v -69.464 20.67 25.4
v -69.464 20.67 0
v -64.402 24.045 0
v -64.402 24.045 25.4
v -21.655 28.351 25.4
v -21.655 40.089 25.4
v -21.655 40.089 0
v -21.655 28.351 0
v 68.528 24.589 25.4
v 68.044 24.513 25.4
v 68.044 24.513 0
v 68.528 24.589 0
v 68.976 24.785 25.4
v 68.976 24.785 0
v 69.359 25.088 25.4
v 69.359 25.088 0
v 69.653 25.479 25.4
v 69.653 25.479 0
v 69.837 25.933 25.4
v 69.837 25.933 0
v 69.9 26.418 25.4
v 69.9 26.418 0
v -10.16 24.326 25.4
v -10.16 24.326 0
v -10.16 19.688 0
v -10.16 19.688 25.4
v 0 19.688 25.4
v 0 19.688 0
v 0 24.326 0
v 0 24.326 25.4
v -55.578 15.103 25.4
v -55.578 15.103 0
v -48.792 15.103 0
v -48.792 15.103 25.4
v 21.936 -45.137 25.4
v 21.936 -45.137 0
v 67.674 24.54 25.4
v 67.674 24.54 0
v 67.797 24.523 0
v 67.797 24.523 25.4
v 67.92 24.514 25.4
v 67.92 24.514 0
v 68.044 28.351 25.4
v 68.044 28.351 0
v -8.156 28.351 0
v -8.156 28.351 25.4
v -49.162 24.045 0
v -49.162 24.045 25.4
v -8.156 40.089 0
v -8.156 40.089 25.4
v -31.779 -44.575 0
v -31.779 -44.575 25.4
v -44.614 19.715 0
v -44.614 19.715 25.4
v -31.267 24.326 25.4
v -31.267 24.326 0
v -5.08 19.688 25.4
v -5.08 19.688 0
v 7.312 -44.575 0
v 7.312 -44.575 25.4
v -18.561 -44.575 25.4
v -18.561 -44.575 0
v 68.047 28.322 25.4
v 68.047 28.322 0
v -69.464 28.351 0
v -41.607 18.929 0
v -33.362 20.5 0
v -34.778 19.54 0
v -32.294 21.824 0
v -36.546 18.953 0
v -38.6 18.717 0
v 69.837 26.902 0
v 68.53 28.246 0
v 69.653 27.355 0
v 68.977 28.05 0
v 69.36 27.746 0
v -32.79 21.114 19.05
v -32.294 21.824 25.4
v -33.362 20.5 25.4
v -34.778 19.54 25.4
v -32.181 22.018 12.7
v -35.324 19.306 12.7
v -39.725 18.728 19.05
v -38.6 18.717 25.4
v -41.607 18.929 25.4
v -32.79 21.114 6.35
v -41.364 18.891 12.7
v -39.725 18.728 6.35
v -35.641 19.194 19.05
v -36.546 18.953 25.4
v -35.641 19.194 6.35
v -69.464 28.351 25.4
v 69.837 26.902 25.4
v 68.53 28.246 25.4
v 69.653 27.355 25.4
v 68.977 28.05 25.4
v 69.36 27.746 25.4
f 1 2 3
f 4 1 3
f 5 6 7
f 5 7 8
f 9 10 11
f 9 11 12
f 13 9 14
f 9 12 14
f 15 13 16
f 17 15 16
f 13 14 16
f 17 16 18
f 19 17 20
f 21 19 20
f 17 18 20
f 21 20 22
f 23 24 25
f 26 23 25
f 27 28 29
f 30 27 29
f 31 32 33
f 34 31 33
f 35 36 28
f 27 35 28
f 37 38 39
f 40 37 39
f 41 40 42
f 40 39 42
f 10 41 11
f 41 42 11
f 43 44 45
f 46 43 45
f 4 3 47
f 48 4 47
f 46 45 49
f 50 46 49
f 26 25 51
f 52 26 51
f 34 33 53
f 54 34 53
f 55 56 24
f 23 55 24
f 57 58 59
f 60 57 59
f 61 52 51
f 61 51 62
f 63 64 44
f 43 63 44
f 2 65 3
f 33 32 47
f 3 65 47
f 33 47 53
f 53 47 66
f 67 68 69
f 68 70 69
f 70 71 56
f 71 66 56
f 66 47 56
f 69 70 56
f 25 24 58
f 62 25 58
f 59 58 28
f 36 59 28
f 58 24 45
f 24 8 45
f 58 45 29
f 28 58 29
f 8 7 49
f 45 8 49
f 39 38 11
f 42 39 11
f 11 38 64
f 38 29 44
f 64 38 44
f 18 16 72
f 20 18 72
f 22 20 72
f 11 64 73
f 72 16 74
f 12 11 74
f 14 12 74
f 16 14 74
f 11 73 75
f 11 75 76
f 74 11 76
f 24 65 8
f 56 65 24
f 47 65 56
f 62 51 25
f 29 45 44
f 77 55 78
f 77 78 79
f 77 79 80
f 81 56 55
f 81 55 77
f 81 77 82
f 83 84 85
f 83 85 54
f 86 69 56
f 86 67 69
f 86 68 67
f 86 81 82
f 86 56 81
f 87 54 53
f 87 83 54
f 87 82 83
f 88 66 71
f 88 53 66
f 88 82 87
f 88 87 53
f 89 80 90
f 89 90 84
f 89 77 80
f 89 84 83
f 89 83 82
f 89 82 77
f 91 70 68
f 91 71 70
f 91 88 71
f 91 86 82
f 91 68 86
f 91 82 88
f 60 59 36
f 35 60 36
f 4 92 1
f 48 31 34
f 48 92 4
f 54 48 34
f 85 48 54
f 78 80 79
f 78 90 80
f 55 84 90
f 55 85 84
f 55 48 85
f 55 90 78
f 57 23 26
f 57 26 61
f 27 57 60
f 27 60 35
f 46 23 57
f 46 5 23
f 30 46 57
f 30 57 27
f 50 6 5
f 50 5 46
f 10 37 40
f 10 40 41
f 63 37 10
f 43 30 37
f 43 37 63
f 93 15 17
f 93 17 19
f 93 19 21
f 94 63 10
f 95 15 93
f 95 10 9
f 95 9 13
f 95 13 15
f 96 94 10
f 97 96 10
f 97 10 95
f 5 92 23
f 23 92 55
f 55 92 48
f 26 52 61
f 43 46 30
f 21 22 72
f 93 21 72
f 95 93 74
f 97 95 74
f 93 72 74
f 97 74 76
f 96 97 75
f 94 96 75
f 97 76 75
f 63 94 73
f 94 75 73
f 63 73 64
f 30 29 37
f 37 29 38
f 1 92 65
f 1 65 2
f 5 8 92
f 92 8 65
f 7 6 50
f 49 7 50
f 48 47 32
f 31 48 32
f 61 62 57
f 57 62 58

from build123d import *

# Parameters (mm, degrees)
F0_W     = 13.4990522638
F0_H     = 6.7189366567
F0_H_2   = 5.0193380237
F1_DEPTH = 25.4


with BuildPart() as f1:
    # F0 (on Top) → F1 (new body)
    with BuildSketch(Plane.XY):
        with Locations((-14.9052026682, 36.7298916125)):
            Rectangle(F0_W, F0_H)
        Polygon((-49.1617234445, 24.0451842546), (-46.0720470312, 28.3510852605), (-69.4638639688, 28.3510852605), (-69.4638639688, 20.6704232842), (-64.4017234445, 24.0451842546), align=None)
        Polygon((-18.5611955822, -44.5749908686), (-5.08, 19.6878403194), (-10.16, 19.6878403194), (-31.7790172994, -44.5749908686), align=None)
        Polygon((21.9359565526, -45.1374538243), (0, 19.6878403194), (-5.08, 19.6878403194), (7.3119853623, -44.5749908686), align=None)
        with Locations((-14.9052026682, 30.8607542723)):
            Rectangle(F0_W, F0_H_2)
        with BuildLine():
            Line((-41.9020165778, 22.7089282594), (-44.6144271886, 19.7146166008))
            add(Edge.make_bspline(
                [(-31.2667824328, 24.3264157325), (-31.9929960152, 21.6699538462), (-34.7602014448, 18.1939718361), (-41.4758034197, 18.5698095031), (-44.6144271886, 19.7146166008)],
                knots=[0, 0, 0, 0, 0.4544832874, 1, 1, 1, 1], degree=3))
            Line((-31.2667824328, 24.3264157325), (-37.5335417804, 24.3264157325))
            add(Edge.make_bspline(
                [(-37.5335417804, 24.3264157325), (-36.8480037486, 22.5468860707), (-34.5986306719, 21.0862357426), (-37.8524884582, 21.3479679078), (-41.9020165778, 22.7089282594)],
                knots=[0, 0, 0, 0, 0.4183773916, 1, 1, 1, 1], degree=3))
        make_face()
        Polygon((0, 19.6878403194), (0, 24.3264157325), (-10.16, 24.3264157325), (-10.16, 19.6878403194), (-5.08, 19.6878403194), align=None)
        with BuildLine():
            Line((-8.1556765363, 28.3510852605), (-21.6547288001, 28.3510852605))
            Line((-21.6547288001, 28.3510852605), (-46.0720470312, 28.3510852605))
            Line((-46.0720470312, 28.3510852605), (-49.1617234445, 24.0451842546))
            Line((-49.1617234445, 24.0451842546), (-55.57827127, 15.1028174692))
            Line((-55.57827127, 15.1028174692), (-48.7920460626, 15.1028174692))
            Line((-48.7920460626, 15.1028174692), (-44.6144271886, 19.7146166008))
            Line((-44.6144271886, 19.7146166008), (-41.9020165778, 22.7089282594))
            Line((-41.9020165778, 22.7089282594), (-40.4368083146, 24.3264157325))
            Line((-40.4368083146, 24.3264157325), (-37.5335417804, 24.3264157325))
            Line((-37.5335417804, 24.3264157325), (-31.2667824328, 24.3264157325))
            Line((-31.2667824328, 24.3264157325), (-10.16, 24.3264157325))
            Line((-10.16, 24.3264157325), (0, 24.3264157325))
            Line((0, 24.3264157325), (67.6737308797, 24.5399160971))
            ThreePointArc((67.6737308797, 24.5399160971), (66.0991955865, 26.6047667833), (68.04705303, 28.3219217342))
            Line((68.04705303, 28.3219217342), (68.0443234637, 28.3510852605))
            Line((68.0443234637, 28.3510852605), (-8.1556765363, 28.3510852605))
        make_face()
        with BuildLine():
            Line((-40.4368083146, 24.3264157325), (-41.9020165778, 22.7089282594))
            add(Edge.make_bspline(
                [(-37.5335417804, 24.3264157325), (-36.8480037486, 22.5468860707), (-34.5986306719, 21.0862357426), (-37.8524884582, 21.3479679078), (-41.9020165778, 22.7089282594)],
                knots=[0, 0, 0, 0, 0.4183773916, 1, 1, 1, 1], degree=3))
            Line((-37.5335417804, 24.3264157325), (-40.4368083146, 24.3264157325))
        make_face()
        with BuildLine():
            ThreePointArc((69.8999820042, 26.4176335186), (69.3603061972, 27.7461344963), (68.04705303, 28.3219217342))
            ThreePointArc((68.04705303, 28.3219217342), (66.0991955865, 26.6047667833), (67.6737308797, 24.5399160971))
            Line((67.6737308797, 24.5399160971), (68.0443234637, 24.5410852605))
            Line((68.0443234637, 24.5410852605), (68.0443234637, 24.5132726231))
            ThreePointArc((68.0443234637, 24.5132726231), (69.3593537425, 25.0881543876), (69.8999820042, 26.4176335186))
        make_face()
        with BuildLine():
            Line((68.0443234637, 24.5410852605), (67.6737308797, 24.5399160971))
            ThreePointArc((67.6737308797, 24.5399160971), (67.8583760557, 24.5175377802), (68.0443234637, 24.5132726231))
            Line((68.0443234637, 24.5132726231), (68.0443234637, 24.5410852605))
        make_face()
    extrude(amount=F1_DEPTH)


solid = f1.part
